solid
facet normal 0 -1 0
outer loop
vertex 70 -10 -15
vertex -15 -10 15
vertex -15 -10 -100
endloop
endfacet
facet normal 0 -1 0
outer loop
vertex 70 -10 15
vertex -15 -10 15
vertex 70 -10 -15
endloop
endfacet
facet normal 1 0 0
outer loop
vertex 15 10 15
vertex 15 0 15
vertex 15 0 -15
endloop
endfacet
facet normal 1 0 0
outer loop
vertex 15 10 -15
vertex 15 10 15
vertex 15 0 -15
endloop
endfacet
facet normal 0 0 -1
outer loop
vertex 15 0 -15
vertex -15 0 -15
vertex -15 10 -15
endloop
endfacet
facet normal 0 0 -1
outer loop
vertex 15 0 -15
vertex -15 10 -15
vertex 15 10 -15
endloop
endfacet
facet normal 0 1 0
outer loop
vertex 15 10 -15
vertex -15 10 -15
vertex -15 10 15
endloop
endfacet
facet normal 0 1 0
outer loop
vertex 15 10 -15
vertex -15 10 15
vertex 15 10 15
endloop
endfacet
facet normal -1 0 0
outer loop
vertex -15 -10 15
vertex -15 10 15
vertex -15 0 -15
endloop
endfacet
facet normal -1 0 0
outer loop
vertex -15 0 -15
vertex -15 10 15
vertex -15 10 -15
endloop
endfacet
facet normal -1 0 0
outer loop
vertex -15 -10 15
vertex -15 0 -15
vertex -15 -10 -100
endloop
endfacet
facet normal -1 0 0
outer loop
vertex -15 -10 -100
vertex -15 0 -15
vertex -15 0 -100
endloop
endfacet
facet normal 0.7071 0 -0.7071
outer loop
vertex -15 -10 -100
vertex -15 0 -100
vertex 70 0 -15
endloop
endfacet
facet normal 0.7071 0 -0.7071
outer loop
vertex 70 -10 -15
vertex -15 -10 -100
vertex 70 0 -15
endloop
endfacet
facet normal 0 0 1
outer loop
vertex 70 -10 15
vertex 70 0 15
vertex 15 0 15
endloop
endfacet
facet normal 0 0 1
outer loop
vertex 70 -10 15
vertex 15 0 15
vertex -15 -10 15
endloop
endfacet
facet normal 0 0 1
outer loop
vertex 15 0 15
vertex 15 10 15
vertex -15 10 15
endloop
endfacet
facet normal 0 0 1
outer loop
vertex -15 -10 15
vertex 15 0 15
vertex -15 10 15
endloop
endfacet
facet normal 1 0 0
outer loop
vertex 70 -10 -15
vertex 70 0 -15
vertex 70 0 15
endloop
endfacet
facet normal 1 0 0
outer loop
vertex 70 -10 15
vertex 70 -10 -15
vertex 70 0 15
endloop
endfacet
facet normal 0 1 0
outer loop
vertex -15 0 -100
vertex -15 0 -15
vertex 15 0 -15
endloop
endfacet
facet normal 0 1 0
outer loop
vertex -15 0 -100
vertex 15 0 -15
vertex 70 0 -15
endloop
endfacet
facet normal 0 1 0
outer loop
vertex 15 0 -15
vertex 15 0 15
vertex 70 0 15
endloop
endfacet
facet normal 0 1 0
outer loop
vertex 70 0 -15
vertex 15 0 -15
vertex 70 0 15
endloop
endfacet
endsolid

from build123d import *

# Parameters (mm, degrees)
SKETCH1_W           = 30
SKETCH1_H           = 30
BOSS_EXTRUDE1_DEPTH = 10
SKETCH3_W           = 55
SKETCH3_H           = 30
SKETCH3_W_2         = 30
BOSS_EXTRUDE3_DEPTH = 10


with BuildPart() as part:
    # Sketch1 → Boss-Extrude1 (new body)
    with BuildSketch(Plane(origin=(0, 0, 0), x_dir=(1, 0, 0), z_dir=(0, 1, 0))):
        Rectangle(SKETCH1_W, SKETCH1_H)
    extrude(amount=BOSS_EXTRUDE1_DEPTH)

    # Sketch3 → Boss-Extrude3 (add)
    with BuildSketch(Plane.XZ):
        with Locations((42.5, 0)):
            Rectangle(SKETCH3_W, SKETCH3_H)
        Polygon((-15, -15), (-15, -100), (70, -15), (15, -15), align=None)
        Rectangle(SKETCH3_W_2, SKETCH3_H)
    extrude(amount=BOSS_EXTRUDE3_DEPTH)


solid = part.part
